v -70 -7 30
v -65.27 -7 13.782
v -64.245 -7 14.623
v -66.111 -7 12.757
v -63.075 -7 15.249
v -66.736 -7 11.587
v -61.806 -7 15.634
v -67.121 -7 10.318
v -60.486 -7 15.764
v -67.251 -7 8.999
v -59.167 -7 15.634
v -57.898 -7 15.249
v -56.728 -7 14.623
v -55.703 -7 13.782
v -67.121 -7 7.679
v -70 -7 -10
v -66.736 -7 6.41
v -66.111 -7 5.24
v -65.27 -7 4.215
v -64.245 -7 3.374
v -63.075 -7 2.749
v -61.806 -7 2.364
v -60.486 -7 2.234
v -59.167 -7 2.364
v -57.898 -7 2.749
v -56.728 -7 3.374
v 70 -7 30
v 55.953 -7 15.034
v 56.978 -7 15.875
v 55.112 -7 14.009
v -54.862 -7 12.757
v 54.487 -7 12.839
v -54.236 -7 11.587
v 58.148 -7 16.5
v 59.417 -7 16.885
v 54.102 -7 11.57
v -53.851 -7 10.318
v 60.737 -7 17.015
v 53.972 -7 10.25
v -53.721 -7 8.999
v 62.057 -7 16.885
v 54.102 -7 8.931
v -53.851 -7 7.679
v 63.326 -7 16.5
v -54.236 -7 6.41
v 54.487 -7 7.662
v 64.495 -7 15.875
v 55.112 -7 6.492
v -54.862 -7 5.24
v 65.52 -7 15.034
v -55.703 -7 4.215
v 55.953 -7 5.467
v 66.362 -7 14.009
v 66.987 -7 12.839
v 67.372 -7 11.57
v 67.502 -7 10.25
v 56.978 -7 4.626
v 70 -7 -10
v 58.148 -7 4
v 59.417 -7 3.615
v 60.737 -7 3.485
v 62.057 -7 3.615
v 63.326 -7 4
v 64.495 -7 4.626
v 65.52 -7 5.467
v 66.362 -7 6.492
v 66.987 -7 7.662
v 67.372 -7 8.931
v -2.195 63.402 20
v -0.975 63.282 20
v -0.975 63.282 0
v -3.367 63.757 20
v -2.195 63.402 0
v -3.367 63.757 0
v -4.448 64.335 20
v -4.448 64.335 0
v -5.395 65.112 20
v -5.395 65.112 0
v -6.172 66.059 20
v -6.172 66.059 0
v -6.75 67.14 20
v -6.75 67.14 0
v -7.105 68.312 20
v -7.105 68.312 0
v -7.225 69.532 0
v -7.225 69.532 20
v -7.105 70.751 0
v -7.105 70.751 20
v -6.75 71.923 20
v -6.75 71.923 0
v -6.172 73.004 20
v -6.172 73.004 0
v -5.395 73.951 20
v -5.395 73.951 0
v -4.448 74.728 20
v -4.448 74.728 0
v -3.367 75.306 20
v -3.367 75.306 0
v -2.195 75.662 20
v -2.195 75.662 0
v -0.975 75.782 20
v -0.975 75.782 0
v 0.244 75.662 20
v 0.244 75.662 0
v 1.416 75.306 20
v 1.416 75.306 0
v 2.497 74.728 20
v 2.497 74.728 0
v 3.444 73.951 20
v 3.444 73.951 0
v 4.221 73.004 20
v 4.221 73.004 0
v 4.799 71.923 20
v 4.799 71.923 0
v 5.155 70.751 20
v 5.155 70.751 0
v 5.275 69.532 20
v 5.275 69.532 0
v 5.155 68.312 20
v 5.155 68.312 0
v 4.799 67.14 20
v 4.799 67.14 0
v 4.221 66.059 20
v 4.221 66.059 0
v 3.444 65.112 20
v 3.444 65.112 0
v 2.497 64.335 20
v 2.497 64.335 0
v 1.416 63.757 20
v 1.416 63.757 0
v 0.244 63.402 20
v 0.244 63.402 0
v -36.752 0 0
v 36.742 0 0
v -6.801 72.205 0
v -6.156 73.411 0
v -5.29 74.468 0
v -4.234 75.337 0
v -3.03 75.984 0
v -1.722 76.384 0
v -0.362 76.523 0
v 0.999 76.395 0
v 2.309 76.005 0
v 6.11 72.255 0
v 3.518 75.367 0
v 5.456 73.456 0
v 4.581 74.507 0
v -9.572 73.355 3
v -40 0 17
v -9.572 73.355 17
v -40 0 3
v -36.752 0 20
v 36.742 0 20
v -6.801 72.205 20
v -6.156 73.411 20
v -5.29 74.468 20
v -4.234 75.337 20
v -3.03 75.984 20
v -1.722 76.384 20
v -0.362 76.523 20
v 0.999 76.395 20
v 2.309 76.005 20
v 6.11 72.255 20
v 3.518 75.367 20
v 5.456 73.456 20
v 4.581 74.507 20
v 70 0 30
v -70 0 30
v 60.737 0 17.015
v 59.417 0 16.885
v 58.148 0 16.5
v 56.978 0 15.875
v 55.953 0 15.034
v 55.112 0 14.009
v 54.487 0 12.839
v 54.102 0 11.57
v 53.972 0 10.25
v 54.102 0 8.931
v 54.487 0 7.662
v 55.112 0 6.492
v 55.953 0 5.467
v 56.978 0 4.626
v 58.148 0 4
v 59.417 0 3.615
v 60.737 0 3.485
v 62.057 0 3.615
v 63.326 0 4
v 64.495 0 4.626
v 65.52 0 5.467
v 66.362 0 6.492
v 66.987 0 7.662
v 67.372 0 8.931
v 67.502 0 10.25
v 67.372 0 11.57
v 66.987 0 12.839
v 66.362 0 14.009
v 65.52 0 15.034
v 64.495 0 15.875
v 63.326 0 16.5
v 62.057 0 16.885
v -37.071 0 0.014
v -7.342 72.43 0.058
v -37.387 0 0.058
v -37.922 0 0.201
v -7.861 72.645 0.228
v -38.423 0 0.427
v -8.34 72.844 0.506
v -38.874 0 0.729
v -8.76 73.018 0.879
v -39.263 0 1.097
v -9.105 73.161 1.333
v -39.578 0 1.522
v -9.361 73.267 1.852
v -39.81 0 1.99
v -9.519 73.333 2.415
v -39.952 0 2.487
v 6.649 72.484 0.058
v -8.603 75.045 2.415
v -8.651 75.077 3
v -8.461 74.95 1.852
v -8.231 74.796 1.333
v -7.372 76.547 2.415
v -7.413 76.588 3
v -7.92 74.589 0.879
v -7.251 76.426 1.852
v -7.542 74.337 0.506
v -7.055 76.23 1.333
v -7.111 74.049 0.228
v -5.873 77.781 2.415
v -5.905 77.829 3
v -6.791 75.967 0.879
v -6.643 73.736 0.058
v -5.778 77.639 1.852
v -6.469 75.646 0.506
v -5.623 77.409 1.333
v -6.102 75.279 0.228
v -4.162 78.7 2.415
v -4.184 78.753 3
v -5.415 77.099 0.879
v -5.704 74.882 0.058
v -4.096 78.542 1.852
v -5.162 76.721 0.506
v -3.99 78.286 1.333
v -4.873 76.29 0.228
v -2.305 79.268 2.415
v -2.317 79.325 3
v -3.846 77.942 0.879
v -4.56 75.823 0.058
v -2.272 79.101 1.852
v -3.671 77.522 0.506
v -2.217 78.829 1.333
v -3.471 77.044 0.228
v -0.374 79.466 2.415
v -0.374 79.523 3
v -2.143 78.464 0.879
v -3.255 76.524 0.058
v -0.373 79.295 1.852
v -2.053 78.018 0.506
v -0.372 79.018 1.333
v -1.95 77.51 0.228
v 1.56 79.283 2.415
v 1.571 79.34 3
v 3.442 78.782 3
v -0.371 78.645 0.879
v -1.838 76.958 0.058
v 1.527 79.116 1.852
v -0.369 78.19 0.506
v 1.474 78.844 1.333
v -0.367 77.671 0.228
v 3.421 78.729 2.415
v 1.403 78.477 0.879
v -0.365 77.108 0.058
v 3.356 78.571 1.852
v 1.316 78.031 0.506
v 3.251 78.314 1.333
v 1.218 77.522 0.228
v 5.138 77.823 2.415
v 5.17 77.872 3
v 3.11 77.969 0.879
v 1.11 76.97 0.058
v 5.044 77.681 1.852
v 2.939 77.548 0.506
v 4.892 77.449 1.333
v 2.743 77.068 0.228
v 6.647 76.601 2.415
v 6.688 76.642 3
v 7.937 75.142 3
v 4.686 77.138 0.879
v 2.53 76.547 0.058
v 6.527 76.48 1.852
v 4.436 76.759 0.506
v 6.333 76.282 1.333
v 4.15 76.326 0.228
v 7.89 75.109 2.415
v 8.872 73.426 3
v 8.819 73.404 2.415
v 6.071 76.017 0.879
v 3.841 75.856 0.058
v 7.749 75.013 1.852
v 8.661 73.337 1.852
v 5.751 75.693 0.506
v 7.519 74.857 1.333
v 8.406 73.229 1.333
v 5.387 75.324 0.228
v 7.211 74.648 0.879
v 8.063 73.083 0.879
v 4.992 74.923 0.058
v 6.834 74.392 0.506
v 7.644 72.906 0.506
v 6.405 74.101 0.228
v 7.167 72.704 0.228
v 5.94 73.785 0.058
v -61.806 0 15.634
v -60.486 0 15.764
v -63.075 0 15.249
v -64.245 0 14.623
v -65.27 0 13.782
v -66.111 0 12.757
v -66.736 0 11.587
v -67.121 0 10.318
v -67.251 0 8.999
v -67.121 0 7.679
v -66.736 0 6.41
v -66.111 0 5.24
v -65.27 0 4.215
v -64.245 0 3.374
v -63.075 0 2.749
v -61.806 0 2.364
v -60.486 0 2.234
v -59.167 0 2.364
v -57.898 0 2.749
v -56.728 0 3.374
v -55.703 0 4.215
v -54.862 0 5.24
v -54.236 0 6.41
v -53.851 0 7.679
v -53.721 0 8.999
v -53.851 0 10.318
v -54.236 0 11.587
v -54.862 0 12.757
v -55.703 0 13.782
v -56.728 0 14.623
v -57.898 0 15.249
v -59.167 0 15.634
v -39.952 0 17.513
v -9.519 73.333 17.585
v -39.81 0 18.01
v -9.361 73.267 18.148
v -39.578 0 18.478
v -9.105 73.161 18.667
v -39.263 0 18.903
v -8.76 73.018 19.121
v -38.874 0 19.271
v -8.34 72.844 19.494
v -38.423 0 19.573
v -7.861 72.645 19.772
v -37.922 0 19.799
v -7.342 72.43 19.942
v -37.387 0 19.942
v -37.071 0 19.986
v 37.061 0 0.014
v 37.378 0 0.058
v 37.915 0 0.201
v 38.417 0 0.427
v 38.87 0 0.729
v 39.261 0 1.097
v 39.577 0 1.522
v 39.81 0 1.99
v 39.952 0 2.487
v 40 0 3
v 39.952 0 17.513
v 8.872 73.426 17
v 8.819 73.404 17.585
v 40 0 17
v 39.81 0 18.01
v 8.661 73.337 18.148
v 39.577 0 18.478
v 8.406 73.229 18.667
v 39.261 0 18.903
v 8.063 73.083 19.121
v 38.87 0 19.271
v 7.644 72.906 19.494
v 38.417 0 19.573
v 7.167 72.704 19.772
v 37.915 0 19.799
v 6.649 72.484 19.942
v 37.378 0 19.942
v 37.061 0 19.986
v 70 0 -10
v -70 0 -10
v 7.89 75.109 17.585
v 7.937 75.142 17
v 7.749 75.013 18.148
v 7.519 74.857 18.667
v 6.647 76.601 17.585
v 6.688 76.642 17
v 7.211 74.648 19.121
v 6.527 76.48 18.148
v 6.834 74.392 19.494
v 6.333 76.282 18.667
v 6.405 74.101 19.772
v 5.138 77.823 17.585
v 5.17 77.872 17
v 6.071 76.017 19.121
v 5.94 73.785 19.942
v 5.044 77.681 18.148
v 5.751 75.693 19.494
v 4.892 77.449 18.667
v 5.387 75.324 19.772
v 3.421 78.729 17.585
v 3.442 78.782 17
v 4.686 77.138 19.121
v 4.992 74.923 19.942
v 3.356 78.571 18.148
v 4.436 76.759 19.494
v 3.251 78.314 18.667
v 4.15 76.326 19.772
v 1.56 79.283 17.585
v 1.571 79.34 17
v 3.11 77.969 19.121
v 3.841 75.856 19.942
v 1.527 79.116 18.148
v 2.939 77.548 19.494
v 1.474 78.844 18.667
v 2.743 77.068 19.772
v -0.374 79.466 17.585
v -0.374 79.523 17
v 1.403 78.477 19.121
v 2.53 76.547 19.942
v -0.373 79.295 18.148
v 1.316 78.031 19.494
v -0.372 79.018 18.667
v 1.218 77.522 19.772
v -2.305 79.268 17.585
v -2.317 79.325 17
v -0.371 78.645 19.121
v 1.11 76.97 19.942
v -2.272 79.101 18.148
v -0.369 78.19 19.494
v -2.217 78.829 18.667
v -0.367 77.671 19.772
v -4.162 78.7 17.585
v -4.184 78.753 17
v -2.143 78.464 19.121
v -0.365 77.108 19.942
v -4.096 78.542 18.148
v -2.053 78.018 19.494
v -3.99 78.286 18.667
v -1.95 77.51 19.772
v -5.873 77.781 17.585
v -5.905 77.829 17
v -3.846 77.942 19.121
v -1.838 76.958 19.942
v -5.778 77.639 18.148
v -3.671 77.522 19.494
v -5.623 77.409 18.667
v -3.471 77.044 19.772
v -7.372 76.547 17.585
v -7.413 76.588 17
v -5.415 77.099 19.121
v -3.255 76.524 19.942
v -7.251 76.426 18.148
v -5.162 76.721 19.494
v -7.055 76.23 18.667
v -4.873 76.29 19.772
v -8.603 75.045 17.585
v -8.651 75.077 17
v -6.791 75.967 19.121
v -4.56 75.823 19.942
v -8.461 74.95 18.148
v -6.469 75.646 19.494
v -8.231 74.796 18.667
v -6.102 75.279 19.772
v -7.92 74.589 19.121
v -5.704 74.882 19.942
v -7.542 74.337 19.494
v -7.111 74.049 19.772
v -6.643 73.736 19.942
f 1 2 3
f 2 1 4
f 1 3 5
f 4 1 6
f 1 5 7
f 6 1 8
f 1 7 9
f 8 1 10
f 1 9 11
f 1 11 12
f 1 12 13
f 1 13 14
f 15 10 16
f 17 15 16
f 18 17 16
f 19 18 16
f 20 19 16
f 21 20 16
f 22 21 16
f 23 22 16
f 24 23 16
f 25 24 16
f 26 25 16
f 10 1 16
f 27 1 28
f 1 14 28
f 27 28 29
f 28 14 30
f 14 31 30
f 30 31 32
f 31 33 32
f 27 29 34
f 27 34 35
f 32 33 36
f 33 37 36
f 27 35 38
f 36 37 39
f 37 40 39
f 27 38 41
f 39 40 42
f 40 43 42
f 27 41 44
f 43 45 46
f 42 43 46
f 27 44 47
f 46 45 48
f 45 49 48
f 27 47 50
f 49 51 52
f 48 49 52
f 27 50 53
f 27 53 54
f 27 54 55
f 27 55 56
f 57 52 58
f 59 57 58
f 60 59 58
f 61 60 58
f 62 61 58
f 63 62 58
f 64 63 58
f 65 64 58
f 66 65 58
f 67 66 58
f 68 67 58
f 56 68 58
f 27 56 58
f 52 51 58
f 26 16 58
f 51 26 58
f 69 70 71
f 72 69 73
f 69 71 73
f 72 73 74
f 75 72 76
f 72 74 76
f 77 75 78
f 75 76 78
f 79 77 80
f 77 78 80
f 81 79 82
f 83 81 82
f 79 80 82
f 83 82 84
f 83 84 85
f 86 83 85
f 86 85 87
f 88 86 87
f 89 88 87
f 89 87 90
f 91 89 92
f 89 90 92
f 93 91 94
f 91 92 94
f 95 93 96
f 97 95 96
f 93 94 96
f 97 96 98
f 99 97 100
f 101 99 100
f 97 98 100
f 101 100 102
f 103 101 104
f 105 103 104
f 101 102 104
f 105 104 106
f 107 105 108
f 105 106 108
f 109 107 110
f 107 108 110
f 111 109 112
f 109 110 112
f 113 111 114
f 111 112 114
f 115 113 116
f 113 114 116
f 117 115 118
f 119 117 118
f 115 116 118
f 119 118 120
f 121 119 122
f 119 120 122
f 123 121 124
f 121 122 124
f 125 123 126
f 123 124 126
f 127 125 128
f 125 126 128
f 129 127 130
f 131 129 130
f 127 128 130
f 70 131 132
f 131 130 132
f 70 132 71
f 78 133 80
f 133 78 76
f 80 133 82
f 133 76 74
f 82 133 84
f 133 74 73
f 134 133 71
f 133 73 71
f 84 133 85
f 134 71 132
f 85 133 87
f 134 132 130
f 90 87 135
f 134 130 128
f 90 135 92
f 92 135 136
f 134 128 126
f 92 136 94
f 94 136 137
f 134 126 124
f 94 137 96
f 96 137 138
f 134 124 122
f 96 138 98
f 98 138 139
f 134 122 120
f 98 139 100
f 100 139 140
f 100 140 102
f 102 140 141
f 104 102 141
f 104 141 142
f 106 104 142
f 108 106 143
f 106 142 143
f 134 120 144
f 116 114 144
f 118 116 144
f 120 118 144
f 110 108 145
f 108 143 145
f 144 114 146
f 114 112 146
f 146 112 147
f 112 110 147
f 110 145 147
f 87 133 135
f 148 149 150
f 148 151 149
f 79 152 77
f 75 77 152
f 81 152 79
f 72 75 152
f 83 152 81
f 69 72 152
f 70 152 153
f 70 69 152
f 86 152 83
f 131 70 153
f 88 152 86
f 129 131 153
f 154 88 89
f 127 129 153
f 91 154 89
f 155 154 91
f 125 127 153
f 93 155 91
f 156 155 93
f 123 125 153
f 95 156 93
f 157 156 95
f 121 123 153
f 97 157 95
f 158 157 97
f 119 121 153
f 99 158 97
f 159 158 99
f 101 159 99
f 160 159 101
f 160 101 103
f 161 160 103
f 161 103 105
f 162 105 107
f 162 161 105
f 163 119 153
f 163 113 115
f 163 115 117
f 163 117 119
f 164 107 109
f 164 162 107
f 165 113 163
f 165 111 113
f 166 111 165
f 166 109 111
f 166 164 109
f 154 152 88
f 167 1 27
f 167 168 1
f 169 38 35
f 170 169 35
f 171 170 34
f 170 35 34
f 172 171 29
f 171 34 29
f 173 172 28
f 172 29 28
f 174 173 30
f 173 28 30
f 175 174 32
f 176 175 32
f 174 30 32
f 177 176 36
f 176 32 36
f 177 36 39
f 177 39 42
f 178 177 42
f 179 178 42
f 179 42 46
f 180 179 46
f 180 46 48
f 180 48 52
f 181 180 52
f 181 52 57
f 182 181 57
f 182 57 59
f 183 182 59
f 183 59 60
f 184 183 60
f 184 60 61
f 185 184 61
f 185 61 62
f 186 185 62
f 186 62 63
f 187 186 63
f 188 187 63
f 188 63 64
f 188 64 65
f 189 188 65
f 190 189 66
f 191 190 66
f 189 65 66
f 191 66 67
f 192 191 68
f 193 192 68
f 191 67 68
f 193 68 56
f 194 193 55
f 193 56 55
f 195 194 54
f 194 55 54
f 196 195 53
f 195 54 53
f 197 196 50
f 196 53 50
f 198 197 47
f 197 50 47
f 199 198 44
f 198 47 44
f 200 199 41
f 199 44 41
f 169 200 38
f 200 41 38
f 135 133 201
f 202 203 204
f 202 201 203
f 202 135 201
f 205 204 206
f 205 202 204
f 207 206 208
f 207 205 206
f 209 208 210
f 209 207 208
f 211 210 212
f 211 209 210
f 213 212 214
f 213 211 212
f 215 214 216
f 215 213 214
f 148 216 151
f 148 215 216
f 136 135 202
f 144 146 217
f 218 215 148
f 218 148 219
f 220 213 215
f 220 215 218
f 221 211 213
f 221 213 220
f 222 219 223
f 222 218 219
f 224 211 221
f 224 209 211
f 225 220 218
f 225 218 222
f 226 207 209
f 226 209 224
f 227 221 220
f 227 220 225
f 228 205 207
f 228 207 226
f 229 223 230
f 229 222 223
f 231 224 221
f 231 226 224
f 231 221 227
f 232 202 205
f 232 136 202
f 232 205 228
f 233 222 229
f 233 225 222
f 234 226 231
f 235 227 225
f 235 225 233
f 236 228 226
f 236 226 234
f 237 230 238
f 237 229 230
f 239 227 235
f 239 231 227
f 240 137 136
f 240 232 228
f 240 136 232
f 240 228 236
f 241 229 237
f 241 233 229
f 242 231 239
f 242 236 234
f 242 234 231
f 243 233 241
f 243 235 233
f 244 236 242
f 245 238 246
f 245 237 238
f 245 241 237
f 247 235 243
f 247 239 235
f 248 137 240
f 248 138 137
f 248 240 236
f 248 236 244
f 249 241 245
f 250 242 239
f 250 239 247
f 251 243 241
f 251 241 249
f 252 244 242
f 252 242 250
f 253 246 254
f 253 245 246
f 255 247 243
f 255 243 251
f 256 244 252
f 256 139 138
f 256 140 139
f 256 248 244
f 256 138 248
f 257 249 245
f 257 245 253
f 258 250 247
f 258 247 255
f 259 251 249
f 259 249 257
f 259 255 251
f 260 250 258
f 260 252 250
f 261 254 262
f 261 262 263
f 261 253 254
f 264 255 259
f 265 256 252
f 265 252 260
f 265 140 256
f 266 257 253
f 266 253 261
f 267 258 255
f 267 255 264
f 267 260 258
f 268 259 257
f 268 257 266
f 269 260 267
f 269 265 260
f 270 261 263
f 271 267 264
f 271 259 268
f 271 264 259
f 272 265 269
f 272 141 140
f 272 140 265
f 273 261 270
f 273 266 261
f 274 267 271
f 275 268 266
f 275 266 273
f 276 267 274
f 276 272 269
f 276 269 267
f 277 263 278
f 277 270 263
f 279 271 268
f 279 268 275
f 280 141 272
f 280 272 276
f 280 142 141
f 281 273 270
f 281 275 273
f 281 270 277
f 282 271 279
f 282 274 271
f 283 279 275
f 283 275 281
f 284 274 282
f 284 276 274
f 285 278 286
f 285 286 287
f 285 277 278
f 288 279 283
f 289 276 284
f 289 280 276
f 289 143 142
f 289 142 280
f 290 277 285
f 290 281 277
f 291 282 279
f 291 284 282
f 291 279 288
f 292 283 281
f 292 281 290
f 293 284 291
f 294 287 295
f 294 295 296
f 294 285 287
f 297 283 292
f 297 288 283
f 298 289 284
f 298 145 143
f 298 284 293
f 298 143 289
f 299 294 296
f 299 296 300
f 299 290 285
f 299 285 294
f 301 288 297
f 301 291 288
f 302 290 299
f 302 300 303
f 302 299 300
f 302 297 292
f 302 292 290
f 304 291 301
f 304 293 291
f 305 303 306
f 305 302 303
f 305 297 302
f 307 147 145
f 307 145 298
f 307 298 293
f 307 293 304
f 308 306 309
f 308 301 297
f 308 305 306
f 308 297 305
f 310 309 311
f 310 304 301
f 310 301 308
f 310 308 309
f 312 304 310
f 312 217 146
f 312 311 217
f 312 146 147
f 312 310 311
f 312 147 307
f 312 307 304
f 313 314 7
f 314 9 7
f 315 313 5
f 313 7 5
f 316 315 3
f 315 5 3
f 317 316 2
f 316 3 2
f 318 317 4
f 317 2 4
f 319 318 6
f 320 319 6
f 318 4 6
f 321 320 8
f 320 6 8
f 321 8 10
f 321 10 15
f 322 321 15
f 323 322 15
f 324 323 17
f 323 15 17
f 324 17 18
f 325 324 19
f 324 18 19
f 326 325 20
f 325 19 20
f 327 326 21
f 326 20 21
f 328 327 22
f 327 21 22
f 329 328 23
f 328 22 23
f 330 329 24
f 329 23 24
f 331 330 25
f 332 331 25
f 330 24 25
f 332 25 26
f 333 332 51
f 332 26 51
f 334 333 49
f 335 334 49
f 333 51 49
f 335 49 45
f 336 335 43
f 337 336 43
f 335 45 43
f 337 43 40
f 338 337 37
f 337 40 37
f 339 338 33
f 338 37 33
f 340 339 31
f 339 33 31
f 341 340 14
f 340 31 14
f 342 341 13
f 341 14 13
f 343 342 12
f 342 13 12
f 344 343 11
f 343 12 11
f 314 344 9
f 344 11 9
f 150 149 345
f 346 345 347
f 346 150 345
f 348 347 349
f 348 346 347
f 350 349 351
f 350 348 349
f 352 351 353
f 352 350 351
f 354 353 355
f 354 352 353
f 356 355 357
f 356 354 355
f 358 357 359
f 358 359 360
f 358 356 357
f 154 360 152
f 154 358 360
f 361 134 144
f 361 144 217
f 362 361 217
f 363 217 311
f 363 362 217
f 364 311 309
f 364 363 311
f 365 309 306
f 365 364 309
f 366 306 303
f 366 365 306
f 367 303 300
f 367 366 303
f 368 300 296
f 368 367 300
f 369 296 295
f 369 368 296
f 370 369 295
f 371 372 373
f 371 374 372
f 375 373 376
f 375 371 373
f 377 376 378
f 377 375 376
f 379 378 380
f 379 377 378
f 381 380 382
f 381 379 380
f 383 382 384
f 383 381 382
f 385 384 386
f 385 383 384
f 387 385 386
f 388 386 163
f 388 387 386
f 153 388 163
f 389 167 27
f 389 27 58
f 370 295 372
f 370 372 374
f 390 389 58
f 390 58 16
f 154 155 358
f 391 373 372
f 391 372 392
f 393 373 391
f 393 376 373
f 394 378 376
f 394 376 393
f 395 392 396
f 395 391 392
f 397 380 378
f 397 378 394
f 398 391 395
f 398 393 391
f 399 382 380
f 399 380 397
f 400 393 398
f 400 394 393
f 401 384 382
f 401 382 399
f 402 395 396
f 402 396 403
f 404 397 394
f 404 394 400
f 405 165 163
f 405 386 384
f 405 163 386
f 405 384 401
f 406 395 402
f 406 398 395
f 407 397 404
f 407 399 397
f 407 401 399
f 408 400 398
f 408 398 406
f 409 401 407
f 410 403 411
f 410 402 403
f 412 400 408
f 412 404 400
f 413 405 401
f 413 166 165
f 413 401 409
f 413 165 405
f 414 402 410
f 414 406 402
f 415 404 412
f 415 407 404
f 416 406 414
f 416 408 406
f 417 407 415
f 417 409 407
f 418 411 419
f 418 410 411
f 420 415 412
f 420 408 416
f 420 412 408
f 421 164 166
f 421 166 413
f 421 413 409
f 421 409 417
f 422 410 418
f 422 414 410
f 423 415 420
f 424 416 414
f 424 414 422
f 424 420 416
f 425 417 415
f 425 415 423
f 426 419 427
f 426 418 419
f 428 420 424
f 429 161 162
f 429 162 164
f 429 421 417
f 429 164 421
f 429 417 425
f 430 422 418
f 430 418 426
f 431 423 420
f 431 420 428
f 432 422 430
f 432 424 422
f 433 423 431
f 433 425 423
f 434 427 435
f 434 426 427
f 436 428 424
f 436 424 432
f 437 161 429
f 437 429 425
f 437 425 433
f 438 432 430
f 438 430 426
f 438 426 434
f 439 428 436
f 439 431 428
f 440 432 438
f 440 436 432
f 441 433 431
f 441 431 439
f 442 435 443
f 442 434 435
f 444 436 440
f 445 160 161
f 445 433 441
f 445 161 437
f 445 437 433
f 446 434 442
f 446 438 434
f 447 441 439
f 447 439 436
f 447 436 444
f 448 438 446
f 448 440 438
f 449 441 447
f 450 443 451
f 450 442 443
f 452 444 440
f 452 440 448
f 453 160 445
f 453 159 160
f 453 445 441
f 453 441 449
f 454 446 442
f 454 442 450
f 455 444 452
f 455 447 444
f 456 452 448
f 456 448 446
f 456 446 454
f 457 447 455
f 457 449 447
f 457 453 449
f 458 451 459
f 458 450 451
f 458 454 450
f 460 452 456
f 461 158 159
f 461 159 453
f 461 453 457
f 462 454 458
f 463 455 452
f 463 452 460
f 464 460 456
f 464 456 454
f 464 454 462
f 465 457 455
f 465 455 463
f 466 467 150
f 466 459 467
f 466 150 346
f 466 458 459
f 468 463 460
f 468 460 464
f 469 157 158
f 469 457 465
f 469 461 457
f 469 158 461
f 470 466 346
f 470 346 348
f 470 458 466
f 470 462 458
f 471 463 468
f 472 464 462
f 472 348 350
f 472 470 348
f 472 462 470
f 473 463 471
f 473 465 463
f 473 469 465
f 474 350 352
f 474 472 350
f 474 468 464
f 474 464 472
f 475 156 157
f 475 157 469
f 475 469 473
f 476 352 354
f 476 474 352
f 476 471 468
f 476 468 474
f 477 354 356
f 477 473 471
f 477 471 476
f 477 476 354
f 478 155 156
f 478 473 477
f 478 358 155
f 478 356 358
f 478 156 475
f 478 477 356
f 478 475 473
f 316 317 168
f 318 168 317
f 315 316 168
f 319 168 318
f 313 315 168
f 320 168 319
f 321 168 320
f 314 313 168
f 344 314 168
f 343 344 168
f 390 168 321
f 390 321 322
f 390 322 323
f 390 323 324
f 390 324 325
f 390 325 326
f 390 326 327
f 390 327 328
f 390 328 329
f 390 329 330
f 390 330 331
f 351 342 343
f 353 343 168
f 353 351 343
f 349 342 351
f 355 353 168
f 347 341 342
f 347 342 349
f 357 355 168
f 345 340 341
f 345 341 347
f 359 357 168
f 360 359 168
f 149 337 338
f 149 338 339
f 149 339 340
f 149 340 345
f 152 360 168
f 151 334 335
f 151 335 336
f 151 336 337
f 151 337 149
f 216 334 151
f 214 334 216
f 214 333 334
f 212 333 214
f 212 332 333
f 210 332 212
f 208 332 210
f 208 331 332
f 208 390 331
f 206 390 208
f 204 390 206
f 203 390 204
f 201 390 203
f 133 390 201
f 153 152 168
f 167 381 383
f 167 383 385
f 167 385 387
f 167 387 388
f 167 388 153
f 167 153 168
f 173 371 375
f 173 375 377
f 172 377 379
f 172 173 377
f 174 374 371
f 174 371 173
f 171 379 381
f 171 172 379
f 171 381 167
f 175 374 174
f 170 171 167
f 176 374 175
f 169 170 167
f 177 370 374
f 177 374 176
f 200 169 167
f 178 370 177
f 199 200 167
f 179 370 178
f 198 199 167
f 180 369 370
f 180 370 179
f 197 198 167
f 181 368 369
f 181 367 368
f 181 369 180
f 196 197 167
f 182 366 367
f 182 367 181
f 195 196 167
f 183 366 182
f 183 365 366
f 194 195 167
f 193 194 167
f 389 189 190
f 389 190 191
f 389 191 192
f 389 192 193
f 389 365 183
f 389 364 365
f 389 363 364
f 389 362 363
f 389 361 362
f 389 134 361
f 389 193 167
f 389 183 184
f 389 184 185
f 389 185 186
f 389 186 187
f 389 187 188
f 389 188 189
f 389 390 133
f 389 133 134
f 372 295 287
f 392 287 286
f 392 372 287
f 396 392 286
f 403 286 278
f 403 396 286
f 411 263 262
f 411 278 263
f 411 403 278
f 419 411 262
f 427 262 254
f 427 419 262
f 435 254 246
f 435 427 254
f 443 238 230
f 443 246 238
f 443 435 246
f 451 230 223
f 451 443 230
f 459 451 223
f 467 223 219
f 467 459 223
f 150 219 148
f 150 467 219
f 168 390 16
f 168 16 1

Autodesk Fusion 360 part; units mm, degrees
sketch "Sketch1" plane through (0, 0, 0) normal (0, 0, 1) x (1, 0, 0)
  line L0 (-40, 0) -> (-0.4355, 95.3806)
  line L1 (-0.4355, 95.3806) -> (40, 0)
  line L2 (40, 0) -> (-40, 0)
extrude "Extrude1" add sketch "Sketch1" along normal blind 20
hole "Hole1" at (-0.9754, 69.5316, 20) direction (0, 0, -1) diameter 12.5 depth 40 tip angle 118
fillet "Fillet1" radius 10 1 edges at (-0.4355, 95.3806, 10)
sketch "Sketch2" plane through (0, 0, 0) normal (0, 1, 0) x (1, 0, 0)
  line L0 (-70, -30) -> (70, -30)
  line L1 (70, -30) -> (70, 10)
  line L2 (70, 10) -> (-70, 10)
  line L3 (-70, 10) -> (-70, -30)
extrude "Extrude2" add sketch "Sketch2" against normal blind 7
hole "Hole2" at (60.7368, 0, 10.2504) direction (0, -1, 0) diameter 13.53 depth 20 tip angle 118
hole "Hole3" at (-60.4864, 0, 8.9986) direction (0, -1, 0) diameter 13.53 depth 20 tip angle 118
fillet "Fillet2" radius 3 6 edges at (-24.786, 36.6774, 20) (-0.3739, 79.5232, 20) (24.4359, 36.7132, 20) (-24.786, 36.6774, 0) (-0.3739, 79.5232, 0) (24.4359, 36.7132, 0)
